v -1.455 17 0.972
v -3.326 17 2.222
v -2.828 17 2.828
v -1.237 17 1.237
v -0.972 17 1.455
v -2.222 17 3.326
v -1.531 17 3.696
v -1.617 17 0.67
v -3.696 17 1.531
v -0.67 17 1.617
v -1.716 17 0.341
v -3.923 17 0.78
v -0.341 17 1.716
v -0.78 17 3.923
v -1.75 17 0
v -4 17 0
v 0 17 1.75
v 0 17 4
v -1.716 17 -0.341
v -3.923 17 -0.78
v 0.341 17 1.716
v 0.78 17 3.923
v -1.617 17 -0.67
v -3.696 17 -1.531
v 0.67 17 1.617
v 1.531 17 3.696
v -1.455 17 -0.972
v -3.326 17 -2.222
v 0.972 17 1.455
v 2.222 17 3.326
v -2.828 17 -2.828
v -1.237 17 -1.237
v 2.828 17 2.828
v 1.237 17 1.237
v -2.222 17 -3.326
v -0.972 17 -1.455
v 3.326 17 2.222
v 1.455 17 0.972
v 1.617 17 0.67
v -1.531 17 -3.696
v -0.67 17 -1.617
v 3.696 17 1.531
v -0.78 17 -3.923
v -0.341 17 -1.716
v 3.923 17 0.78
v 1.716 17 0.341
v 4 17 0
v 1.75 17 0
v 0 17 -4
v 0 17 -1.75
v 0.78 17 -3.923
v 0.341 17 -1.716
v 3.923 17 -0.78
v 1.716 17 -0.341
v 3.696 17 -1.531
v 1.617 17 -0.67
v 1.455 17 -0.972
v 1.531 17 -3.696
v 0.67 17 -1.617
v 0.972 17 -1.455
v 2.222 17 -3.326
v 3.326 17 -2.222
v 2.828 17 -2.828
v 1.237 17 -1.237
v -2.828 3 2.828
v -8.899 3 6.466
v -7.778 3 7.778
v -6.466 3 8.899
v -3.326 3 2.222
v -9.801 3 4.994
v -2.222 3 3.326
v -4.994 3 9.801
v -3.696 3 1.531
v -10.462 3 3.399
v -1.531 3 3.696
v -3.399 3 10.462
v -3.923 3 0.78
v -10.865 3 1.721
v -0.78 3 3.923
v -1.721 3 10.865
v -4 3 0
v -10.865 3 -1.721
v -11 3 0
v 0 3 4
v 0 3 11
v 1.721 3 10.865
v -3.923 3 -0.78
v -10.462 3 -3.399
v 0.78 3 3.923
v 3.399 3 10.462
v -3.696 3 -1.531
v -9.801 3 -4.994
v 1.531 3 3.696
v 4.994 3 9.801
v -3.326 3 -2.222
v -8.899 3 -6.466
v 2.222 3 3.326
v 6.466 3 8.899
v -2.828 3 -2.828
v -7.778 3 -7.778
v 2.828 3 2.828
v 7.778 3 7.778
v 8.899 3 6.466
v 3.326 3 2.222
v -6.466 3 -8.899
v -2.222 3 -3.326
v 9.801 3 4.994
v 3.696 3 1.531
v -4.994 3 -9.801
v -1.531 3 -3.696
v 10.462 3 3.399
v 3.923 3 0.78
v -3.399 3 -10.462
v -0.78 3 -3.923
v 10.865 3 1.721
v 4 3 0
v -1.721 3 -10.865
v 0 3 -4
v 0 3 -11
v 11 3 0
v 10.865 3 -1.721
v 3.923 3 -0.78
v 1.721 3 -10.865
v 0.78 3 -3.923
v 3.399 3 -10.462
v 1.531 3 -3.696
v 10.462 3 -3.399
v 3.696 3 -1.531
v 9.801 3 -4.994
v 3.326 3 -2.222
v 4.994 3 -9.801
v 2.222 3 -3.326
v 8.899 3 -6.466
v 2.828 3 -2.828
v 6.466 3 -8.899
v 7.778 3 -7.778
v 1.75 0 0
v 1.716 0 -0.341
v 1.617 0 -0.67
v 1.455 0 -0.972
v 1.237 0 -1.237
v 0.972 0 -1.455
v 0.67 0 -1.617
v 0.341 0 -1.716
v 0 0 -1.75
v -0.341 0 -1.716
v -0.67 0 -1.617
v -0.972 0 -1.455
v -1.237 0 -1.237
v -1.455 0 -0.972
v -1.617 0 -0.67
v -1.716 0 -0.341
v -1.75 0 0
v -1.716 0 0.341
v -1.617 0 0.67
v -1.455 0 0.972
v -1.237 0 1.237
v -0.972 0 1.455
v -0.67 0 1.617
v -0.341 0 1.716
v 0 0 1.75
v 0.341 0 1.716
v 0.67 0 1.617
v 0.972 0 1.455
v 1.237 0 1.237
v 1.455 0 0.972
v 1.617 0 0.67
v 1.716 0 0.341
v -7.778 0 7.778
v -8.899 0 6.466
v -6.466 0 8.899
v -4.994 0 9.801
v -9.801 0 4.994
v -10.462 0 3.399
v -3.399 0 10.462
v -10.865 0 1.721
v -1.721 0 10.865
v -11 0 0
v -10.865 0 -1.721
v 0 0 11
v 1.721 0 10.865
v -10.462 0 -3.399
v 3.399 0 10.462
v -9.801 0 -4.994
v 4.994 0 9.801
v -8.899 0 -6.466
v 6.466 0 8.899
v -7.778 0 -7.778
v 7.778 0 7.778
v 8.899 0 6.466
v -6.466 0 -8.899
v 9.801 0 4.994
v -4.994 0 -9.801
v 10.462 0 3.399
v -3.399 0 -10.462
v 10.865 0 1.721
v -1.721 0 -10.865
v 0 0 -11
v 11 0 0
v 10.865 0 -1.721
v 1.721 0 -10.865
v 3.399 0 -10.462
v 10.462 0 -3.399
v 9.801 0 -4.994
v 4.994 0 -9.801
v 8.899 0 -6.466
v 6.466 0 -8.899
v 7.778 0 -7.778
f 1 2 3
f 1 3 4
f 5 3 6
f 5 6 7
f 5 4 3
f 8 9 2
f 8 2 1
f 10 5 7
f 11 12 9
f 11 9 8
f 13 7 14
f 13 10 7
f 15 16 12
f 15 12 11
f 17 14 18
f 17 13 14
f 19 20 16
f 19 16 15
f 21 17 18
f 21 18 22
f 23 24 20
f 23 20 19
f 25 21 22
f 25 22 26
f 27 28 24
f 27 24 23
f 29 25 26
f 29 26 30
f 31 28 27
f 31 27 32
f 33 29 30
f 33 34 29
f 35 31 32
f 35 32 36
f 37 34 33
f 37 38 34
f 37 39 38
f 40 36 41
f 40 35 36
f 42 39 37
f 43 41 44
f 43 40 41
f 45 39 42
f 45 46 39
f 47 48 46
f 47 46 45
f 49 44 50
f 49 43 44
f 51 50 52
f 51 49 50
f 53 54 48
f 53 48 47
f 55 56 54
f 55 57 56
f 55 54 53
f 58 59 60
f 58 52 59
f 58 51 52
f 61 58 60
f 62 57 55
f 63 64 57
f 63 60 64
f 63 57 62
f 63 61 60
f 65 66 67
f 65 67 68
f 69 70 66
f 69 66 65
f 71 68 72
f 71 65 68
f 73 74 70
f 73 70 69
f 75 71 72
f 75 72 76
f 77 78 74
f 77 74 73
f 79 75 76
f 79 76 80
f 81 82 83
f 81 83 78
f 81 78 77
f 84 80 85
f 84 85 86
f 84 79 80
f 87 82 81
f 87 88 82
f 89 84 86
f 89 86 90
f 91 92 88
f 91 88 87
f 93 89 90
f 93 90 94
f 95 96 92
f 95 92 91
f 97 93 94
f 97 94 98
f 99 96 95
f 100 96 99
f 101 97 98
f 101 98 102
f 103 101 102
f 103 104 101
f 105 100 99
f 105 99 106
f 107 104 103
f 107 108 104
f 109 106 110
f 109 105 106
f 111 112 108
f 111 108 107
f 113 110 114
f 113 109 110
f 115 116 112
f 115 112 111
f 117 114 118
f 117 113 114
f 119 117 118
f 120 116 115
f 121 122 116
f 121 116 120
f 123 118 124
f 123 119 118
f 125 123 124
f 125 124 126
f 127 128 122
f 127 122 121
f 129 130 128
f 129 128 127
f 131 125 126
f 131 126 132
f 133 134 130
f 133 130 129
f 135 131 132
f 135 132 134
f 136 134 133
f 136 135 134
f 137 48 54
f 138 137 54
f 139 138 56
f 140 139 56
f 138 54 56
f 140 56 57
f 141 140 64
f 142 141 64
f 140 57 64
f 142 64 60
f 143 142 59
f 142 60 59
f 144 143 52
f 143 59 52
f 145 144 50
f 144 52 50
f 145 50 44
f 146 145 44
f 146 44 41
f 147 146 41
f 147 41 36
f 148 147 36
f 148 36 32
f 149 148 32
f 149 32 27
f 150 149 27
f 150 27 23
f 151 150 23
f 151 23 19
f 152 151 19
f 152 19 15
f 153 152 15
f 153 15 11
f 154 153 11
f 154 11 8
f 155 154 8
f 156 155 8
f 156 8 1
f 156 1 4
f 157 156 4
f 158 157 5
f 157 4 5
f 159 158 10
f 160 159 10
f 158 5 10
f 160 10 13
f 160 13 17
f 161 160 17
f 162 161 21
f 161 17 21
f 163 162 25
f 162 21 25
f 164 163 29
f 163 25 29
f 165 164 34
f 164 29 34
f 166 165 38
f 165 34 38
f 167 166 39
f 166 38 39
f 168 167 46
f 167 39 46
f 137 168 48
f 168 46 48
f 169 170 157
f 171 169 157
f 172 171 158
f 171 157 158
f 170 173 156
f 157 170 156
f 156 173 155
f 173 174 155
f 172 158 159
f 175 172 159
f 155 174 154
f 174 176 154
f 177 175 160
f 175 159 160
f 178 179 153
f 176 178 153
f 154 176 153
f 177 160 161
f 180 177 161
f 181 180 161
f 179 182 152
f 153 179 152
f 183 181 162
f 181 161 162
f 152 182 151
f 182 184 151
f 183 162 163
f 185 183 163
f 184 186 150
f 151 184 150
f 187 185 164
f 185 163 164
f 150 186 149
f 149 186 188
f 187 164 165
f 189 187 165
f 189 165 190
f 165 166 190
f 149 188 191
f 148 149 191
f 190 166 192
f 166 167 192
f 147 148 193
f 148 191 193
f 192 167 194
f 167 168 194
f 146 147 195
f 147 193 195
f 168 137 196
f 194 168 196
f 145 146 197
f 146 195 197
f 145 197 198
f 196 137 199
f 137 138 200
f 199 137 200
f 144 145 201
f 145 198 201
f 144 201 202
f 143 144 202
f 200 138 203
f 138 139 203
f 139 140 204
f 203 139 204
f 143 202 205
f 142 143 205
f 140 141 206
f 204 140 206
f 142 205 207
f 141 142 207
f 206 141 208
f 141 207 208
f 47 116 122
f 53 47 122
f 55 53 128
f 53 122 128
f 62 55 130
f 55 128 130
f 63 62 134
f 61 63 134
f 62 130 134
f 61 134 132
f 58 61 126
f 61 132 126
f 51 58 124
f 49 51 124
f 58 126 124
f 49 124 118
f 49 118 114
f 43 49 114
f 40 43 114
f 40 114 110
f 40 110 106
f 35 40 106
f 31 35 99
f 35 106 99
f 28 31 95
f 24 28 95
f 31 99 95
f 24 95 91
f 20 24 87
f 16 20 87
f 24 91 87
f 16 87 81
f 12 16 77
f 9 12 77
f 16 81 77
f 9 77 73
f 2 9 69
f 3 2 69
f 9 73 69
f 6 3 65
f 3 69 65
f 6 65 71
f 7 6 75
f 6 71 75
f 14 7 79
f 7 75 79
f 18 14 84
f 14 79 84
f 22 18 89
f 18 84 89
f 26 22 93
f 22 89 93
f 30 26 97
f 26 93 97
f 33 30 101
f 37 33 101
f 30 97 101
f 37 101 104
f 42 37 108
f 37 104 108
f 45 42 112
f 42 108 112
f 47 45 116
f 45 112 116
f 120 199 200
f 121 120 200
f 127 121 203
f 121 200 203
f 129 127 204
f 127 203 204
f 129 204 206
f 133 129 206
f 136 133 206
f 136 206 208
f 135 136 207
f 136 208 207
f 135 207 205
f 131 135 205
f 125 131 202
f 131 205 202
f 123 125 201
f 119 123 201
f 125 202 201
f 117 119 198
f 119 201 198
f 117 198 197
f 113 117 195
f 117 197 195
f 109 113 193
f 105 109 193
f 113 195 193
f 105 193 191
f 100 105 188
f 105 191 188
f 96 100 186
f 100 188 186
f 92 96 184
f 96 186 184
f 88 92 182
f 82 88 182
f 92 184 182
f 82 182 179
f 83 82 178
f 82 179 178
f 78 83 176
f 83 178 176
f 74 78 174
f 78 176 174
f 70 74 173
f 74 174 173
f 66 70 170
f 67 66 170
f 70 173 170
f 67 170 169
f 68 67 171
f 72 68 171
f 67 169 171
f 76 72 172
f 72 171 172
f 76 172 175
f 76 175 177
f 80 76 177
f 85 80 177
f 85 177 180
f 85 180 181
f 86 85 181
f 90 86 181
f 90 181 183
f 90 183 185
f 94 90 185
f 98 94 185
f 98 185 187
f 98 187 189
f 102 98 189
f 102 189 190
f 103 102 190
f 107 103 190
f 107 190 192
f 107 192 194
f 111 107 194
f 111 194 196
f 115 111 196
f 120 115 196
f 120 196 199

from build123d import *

# Parameters (mm, degrees)
SKETCH1_R           = 11
BOSS_EXTRUDE1_DEPTH = 3
SKETCH2_R           = 4
BOSS_EXTRUDE2_DEPTH = 14
SKETCH3_R           = 1.75
CUT_EXTRUDE1_DEPTH  = 20


with BuildPart() as part:
    # Sketch1 → Boss-Extrude1 (new body)
    with BuildSketch(Plane(origin=(0, 0, 0), x_dir=(1, 0, 0), z_dir=(0, 1, 0))):
        Circle(SKETCH1_R)
    extrude(amount=BOSS_EXTRUDE1_DEPTH)

    # Sketch2 → Boss-Extrude2 (add)
    with BuildSketch(Plane(origin=(0, 3, 0), x_dir=(1, 0, 0), z_dir=(0, 1, 0))):
        Circle(SKETCH2_R)
    extrude(amount=BOSS_EXTRUDE2_DEPTH)

    # Sketch3 → Cut-Extrude1 (cut)
    with BuildSketch(Plane(origin=(0, 17, 0), x_dir=(1, 0, 0), z_dir=(0, 1, 0))):
        Circle(SKETCH3_R)
    extrude(amount=-CUT_EXTRUDE1_DEPTH, mode=Mode.SUBTRACT)


solid = part.part
